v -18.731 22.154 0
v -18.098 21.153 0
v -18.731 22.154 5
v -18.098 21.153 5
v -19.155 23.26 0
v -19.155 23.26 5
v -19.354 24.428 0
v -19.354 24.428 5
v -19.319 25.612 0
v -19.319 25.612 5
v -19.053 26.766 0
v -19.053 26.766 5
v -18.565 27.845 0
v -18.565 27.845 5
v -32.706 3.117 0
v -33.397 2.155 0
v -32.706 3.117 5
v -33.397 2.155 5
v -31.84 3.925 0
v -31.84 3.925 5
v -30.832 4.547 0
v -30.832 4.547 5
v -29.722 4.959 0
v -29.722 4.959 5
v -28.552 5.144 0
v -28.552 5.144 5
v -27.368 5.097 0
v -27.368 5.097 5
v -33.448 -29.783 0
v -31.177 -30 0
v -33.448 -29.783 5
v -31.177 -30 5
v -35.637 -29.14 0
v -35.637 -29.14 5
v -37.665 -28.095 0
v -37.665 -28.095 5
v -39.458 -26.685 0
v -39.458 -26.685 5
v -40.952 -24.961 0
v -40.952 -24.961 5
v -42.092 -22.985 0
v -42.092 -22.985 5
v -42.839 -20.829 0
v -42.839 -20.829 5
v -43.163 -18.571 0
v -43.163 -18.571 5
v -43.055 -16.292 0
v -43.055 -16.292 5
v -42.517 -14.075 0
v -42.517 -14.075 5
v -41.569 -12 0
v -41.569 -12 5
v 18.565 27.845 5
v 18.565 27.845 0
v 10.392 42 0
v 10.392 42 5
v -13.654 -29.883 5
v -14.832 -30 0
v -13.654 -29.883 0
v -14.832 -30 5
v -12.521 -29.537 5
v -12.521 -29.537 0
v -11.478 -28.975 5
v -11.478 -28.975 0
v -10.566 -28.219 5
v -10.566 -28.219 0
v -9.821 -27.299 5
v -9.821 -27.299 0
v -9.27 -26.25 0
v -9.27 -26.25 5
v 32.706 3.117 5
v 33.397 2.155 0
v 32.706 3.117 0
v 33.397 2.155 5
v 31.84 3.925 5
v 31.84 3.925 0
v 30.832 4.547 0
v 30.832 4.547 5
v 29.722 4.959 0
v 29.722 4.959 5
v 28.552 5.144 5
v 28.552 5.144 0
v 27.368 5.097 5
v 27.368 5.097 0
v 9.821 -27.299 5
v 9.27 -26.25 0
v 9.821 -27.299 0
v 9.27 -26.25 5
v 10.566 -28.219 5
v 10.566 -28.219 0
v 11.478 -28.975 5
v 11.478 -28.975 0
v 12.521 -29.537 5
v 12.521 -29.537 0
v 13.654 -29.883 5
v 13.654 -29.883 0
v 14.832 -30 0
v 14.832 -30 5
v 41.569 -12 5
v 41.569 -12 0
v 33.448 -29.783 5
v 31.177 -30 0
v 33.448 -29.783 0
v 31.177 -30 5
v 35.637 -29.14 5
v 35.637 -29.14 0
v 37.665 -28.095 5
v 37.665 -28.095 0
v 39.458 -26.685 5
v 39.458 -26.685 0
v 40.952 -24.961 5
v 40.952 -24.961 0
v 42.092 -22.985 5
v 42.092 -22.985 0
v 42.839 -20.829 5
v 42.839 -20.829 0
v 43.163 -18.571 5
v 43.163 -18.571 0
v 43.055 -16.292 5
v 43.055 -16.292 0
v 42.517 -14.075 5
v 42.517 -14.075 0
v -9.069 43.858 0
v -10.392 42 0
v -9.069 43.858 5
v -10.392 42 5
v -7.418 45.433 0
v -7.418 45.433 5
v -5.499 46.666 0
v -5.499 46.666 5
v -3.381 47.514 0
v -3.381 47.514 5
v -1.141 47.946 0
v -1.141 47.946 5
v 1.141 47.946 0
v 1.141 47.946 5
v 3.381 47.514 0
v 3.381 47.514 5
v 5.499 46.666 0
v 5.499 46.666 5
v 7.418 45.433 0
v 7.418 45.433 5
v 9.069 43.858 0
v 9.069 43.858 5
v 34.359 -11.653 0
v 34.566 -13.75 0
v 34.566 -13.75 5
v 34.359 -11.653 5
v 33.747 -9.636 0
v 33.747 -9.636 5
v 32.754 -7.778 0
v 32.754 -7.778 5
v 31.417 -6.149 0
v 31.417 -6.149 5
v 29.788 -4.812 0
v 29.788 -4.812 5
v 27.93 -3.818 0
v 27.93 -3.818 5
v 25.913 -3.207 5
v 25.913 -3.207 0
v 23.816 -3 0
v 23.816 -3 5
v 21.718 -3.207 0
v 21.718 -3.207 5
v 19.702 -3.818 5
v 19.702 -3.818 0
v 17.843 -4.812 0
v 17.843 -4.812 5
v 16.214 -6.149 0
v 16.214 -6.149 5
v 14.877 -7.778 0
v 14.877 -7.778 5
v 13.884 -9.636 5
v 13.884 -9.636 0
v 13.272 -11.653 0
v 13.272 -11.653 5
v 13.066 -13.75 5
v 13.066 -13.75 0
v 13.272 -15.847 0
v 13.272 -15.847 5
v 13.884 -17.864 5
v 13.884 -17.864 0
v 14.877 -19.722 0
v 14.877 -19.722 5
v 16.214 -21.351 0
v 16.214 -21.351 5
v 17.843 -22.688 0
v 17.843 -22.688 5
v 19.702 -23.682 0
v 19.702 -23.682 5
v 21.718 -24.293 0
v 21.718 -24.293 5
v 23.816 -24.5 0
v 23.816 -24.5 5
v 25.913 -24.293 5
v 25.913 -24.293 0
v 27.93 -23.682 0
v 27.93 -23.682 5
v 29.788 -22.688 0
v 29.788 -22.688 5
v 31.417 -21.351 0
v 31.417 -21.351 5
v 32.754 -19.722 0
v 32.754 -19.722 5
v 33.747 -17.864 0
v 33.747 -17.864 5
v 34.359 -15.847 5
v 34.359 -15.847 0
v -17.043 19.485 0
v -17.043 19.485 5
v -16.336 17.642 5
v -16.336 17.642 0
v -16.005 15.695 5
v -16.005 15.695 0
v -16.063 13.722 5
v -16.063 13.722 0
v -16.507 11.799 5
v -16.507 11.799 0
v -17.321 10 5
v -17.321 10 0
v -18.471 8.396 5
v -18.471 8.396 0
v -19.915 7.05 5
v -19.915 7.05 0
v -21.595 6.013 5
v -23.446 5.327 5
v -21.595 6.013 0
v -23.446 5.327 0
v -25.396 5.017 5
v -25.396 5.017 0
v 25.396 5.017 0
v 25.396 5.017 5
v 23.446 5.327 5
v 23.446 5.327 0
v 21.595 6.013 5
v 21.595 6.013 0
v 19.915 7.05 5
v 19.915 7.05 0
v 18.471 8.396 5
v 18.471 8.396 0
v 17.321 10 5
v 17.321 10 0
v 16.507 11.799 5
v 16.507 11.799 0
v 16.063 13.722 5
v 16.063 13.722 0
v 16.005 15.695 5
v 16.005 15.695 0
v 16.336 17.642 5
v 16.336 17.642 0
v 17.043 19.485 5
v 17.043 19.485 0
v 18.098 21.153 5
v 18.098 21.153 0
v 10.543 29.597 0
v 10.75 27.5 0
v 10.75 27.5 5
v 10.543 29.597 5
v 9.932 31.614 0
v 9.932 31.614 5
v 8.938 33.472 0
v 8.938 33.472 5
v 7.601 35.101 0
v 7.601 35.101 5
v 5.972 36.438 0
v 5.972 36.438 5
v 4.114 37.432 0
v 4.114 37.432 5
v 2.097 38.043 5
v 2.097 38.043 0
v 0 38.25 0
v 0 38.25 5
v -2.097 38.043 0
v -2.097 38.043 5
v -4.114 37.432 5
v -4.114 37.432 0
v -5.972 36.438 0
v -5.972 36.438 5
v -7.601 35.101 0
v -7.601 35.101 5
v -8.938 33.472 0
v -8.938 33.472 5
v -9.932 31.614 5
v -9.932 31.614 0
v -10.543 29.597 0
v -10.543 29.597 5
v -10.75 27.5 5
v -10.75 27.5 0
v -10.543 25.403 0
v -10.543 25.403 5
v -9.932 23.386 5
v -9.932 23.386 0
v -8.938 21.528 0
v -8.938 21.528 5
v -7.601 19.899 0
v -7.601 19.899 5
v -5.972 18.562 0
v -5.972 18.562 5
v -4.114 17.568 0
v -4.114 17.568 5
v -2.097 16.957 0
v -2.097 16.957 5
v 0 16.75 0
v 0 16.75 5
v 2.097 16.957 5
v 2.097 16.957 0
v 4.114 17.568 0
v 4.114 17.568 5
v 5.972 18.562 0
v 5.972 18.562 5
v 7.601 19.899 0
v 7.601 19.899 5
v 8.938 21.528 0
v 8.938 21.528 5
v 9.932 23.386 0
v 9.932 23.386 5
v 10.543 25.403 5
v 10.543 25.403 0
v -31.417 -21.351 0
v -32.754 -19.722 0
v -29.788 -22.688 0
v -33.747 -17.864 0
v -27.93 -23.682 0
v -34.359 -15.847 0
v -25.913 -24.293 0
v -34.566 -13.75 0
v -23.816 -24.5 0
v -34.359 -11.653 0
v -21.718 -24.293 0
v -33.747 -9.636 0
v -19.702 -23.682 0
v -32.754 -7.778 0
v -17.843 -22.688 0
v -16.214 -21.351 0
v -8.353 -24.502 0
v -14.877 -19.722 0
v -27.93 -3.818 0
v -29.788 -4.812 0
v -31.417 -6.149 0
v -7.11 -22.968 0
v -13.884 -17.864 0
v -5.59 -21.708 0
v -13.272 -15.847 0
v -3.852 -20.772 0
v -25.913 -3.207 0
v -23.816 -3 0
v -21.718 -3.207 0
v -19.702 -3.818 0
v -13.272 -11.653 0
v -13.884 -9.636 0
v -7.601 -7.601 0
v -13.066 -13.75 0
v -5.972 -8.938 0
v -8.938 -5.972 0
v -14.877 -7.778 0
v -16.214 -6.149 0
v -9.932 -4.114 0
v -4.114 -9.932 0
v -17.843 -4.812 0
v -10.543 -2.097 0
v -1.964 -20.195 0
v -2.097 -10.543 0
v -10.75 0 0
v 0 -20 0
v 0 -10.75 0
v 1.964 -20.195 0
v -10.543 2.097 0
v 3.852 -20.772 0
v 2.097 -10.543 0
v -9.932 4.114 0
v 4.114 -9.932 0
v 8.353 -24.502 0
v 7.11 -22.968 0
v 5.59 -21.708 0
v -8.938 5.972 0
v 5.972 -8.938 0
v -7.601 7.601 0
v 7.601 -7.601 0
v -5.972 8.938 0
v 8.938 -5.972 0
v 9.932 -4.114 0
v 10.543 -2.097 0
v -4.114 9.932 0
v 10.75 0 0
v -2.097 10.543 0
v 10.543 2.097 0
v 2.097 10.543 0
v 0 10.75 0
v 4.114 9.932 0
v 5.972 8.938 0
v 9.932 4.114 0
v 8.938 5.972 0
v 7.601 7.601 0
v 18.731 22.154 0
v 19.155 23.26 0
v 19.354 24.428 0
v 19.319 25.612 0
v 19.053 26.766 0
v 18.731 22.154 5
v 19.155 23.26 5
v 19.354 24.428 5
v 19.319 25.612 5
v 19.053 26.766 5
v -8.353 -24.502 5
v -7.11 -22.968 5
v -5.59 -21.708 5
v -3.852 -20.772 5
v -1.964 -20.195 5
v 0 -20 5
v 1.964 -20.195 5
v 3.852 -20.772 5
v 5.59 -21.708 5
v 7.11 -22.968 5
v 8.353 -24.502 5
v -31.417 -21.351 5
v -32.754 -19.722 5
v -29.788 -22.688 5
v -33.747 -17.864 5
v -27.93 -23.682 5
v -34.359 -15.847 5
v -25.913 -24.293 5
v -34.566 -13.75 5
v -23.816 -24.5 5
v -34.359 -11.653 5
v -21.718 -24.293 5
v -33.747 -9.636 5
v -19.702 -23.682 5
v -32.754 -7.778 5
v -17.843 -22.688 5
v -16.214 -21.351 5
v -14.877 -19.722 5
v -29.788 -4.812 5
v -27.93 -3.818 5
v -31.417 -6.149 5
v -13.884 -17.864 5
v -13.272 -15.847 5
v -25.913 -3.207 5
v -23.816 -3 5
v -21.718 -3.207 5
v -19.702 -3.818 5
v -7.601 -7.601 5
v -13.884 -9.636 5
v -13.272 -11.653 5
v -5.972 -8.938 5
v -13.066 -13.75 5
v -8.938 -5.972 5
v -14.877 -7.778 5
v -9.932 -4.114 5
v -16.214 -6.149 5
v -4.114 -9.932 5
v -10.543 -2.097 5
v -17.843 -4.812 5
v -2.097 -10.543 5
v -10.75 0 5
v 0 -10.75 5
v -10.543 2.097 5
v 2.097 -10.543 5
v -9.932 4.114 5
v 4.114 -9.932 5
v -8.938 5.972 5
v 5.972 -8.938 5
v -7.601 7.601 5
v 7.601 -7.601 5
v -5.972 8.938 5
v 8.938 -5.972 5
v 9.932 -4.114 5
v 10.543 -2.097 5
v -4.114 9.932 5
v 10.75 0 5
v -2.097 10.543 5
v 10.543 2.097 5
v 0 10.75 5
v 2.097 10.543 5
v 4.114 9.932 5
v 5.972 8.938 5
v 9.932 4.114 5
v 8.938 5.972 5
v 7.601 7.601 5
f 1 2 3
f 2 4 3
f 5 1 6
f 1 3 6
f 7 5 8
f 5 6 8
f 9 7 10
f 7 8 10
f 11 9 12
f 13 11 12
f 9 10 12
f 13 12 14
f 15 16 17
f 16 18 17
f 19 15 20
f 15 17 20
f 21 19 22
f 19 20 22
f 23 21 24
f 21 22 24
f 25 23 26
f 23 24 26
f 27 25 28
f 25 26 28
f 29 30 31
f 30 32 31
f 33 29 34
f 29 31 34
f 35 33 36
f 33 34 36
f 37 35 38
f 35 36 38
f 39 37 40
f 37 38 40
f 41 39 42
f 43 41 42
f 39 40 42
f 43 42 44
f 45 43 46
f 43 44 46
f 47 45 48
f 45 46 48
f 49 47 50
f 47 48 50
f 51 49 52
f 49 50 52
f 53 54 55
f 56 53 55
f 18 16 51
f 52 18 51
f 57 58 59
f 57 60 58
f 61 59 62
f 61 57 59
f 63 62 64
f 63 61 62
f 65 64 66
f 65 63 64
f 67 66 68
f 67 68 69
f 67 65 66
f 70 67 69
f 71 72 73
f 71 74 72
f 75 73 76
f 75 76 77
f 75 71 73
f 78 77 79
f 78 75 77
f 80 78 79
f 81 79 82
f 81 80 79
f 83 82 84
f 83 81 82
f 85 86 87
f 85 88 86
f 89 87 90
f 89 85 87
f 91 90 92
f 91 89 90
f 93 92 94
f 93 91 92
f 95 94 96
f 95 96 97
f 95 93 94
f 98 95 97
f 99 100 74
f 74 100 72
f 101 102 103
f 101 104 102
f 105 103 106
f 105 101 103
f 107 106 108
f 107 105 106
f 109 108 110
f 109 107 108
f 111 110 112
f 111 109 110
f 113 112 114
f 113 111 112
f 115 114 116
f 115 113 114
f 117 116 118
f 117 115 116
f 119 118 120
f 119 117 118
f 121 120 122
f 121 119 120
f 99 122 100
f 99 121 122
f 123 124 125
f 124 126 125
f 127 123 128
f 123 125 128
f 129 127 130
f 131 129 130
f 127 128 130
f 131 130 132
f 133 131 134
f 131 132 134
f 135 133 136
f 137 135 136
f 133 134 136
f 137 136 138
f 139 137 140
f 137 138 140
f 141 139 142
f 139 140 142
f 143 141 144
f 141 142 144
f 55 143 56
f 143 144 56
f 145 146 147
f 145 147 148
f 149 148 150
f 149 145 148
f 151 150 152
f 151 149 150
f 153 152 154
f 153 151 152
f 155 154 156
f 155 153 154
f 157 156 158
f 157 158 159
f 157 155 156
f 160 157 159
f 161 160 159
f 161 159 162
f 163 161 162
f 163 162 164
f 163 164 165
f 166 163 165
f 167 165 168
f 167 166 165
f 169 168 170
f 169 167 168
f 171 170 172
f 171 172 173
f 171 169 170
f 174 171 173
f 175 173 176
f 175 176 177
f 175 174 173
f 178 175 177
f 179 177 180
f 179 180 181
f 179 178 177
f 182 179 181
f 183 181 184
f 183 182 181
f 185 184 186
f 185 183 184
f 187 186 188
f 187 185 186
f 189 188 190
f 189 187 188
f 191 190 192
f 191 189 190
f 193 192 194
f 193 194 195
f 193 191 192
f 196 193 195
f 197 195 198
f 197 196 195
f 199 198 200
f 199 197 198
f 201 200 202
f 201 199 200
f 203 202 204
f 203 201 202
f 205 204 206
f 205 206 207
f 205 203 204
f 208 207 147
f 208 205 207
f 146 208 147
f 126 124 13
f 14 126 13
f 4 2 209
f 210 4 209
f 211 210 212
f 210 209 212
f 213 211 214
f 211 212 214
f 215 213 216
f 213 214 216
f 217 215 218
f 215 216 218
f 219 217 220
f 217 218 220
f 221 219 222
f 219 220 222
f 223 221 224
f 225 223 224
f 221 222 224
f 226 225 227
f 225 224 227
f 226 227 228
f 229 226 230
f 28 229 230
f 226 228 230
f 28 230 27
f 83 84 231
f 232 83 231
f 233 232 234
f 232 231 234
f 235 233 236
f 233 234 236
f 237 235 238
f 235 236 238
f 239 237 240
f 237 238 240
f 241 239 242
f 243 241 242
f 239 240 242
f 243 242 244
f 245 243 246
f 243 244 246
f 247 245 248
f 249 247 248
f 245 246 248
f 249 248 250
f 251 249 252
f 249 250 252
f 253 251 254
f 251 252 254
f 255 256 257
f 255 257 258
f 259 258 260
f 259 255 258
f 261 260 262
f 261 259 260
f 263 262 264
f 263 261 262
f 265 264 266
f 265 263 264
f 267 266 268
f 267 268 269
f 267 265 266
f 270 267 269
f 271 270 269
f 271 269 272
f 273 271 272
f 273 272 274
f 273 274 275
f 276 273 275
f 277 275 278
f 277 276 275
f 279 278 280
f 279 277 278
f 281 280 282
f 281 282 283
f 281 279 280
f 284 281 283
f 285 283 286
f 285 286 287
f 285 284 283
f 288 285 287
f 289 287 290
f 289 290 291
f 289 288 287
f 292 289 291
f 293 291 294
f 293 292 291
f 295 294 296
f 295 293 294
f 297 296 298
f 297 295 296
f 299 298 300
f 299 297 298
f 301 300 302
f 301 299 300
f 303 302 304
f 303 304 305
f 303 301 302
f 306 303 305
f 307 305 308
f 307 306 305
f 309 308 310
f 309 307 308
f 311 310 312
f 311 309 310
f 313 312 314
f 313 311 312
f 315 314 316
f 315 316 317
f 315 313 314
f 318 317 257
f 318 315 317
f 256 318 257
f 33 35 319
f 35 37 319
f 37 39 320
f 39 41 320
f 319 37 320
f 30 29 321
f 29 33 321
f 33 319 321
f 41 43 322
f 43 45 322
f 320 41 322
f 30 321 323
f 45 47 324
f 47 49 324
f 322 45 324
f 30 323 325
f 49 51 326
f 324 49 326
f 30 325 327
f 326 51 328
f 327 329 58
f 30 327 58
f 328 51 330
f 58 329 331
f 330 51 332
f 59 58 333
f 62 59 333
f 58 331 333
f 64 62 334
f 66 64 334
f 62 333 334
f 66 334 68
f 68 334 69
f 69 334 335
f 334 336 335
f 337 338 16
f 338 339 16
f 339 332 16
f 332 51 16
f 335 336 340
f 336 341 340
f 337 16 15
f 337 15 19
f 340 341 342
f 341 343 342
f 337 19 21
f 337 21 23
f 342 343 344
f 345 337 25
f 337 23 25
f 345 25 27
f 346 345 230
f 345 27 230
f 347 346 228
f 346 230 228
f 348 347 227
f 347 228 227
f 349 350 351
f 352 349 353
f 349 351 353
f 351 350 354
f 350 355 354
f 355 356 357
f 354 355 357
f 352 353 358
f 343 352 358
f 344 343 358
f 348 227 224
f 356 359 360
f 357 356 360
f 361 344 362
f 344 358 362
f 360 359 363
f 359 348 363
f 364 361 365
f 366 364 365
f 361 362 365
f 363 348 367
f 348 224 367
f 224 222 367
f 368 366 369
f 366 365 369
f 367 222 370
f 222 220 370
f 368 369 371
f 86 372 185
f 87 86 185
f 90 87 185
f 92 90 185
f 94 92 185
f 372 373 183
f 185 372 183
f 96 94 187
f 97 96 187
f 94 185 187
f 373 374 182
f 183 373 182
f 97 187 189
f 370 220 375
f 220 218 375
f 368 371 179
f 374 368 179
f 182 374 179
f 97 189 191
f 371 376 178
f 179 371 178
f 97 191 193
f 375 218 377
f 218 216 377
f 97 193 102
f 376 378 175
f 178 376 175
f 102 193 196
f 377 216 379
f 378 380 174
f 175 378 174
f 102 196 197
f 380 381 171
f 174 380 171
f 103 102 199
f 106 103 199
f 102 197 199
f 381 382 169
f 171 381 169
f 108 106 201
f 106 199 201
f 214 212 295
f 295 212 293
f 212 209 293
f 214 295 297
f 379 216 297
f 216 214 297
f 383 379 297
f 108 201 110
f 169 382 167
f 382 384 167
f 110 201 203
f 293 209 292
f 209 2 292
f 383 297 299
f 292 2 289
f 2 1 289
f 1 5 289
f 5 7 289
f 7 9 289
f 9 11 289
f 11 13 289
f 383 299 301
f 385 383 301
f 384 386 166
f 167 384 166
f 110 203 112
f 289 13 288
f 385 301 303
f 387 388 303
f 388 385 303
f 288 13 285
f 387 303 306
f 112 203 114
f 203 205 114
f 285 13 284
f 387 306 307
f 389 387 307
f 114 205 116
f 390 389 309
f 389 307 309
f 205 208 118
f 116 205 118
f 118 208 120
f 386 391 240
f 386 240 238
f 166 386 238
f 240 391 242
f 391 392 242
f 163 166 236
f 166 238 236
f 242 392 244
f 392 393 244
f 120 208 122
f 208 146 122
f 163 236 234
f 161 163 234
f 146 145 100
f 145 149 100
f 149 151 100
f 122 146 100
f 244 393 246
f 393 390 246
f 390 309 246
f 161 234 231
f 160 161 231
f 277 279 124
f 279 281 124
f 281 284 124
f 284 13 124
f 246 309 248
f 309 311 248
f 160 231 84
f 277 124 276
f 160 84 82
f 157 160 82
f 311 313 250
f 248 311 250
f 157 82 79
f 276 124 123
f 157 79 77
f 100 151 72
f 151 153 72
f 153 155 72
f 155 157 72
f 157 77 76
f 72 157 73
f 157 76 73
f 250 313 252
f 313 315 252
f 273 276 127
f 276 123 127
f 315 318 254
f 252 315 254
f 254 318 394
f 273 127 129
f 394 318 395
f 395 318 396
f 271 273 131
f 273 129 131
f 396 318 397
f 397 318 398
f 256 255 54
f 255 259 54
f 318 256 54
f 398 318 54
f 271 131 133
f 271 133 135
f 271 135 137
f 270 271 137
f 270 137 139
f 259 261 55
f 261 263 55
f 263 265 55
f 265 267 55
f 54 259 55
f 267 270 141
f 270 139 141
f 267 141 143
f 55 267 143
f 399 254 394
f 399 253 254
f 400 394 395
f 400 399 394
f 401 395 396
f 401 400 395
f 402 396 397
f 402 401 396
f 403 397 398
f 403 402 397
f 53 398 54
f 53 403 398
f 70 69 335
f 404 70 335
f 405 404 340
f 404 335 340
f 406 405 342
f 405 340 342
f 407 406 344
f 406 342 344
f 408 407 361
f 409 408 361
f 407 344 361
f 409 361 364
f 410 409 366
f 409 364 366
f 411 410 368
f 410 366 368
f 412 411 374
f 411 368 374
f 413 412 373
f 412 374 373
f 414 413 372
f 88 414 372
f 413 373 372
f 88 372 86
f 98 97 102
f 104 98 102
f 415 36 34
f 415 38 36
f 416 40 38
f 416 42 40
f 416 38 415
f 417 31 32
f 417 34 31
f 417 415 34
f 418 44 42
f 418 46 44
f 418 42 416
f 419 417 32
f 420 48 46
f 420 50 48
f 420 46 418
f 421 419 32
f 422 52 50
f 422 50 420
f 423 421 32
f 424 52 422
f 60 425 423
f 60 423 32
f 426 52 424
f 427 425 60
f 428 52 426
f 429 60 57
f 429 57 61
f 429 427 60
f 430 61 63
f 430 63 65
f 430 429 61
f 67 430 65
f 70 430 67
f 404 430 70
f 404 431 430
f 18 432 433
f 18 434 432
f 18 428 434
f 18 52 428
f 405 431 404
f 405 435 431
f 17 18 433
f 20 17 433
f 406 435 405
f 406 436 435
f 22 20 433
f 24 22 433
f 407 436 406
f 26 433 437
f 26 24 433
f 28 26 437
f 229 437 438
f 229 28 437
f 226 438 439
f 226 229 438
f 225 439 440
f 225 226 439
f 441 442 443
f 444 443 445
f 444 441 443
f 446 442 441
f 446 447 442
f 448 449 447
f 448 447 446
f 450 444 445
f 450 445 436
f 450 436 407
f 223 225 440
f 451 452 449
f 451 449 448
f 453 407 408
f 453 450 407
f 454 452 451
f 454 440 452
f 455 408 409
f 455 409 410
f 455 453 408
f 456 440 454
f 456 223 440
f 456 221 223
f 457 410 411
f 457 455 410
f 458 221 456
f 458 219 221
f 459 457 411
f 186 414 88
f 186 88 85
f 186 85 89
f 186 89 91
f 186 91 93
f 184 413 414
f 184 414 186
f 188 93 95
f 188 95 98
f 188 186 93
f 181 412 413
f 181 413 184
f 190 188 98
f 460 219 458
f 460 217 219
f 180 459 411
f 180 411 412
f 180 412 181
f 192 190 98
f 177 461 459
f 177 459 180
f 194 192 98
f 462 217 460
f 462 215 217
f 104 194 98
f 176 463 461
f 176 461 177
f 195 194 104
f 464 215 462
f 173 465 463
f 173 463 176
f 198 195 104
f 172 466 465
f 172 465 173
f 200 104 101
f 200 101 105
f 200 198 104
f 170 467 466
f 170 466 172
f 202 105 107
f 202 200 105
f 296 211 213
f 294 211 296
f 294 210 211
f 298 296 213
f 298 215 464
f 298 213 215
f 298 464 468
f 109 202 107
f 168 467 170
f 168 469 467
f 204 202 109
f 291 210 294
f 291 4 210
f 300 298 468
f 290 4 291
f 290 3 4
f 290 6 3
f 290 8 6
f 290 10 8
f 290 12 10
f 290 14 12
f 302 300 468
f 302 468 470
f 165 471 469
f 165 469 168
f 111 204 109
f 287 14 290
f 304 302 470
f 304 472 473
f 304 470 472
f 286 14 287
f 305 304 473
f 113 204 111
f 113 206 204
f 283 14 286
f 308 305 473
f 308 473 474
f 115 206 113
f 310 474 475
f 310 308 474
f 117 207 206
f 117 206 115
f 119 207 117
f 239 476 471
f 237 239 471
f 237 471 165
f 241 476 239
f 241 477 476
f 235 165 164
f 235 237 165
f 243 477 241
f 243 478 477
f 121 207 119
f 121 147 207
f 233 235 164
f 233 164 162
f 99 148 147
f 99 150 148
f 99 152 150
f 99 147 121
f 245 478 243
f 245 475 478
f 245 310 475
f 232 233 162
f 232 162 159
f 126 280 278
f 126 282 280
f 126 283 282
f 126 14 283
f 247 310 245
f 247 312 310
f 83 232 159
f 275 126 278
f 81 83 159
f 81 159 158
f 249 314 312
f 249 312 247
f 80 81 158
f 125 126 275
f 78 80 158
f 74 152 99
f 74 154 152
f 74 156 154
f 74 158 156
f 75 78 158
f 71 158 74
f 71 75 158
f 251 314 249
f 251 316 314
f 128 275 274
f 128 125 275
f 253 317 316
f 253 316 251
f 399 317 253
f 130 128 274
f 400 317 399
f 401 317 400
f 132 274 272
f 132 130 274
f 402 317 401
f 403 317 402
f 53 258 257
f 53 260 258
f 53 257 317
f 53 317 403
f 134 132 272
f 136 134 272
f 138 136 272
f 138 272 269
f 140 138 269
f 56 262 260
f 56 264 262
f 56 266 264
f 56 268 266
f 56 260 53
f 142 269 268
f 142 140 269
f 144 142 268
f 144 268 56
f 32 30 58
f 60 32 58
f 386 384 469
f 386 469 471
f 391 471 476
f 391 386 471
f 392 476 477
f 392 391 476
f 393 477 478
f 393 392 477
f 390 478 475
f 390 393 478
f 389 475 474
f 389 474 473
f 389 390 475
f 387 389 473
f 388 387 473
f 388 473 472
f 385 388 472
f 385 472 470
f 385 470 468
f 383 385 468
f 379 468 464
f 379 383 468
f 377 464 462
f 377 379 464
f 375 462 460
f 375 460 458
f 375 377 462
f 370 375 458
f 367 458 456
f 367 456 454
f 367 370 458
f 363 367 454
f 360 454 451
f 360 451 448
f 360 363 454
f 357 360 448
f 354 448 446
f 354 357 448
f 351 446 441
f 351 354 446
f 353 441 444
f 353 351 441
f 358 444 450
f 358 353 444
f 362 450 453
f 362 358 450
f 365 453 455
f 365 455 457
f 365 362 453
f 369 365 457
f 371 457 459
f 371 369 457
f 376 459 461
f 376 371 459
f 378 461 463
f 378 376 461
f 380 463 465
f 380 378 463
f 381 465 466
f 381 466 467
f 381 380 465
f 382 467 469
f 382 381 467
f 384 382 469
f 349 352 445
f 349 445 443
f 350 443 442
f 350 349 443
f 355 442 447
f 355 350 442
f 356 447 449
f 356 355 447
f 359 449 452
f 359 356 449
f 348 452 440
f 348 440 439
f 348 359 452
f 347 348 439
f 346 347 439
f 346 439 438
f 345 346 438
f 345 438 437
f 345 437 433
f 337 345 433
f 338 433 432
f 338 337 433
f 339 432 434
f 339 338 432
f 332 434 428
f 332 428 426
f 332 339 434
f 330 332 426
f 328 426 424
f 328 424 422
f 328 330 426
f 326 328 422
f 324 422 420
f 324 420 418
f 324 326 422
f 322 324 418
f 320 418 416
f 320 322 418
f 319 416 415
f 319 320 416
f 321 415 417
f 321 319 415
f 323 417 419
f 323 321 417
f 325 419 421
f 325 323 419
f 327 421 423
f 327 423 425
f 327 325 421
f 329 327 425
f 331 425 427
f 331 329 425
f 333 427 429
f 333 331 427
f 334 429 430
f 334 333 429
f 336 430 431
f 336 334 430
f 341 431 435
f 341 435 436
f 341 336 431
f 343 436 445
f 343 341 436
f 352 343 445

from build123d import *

# Parameters (mm, degrees)
F0_R     = 10.75
F1_DEPTH = 5
F2_R     = 12
F3_R     = 6


with BuildPart() as f1:
    # F0 (on Top) → F1 (new body)
    with BuildSketch(Plane.XY):
        with BuildLine():
            ThreePointArc((-10, -30), (0, -20), (10, -30))
            Line((10, -30), (51.961524, -30))
            Line((51.961524, -30), (30.980762, 6.339746))
            ThreePointArc((30.980762, 6.339746), (17.320508, 10), (20.980762, 23.660254))
            Line((20.980762, 23.660254), (0, 60))
            Line((0, 60), (-20.980762, 23.660254))
            ThreePointArc((-20.980762, 23.660254), (-17.320508, 10), (-30.980762, 6.339746))
            Line((-30.980762, 6.339746), (-51.961524, -30))
            Line((-51.961524, -30), (-10, -30))
        make_face()
        with Locations((-23.8157, -13.749997)):
            Circle(F0_R, mode=Mode.SUBTRACT)
        with Locations((23.815698, -13.750001)):
            Circle(F0_R, mode=Mode.SUBTRACT)
        Circle(F0_R, mode=Mode.SUBTRACT)
        with Locations((0, 27.5)):
            Circle(F0_R, mode=Mode.SUBTRACT)
    extrude(amount=F1_DEPTH)

    # F2
    f2_edges = [f1.edges().sort_by_distance(p)[0] for p in [
        (-51.961524, -30, 2.5),
        (51.961524, -30, 2.5),
        (0, 60, 2.5),
    ]]
    fillet(f2_edges, radius=F2_R)

    # F3
    f3_edges = [f1.edges().sort_by_distance(p)[0] for p in [
        (30.980762, 6.339746, 2.5),
        (20.980762, 23.660254, 2.5),
        (-20.980762, 23.660254, 2.5),
        (-30.980762, 6.339746, 2.5),
        (-10, -30, 2.5),
        (10, -30, 2.5),
    ]]
    fillet(f3_edges, radius=F3_R)


solid = f1.part
